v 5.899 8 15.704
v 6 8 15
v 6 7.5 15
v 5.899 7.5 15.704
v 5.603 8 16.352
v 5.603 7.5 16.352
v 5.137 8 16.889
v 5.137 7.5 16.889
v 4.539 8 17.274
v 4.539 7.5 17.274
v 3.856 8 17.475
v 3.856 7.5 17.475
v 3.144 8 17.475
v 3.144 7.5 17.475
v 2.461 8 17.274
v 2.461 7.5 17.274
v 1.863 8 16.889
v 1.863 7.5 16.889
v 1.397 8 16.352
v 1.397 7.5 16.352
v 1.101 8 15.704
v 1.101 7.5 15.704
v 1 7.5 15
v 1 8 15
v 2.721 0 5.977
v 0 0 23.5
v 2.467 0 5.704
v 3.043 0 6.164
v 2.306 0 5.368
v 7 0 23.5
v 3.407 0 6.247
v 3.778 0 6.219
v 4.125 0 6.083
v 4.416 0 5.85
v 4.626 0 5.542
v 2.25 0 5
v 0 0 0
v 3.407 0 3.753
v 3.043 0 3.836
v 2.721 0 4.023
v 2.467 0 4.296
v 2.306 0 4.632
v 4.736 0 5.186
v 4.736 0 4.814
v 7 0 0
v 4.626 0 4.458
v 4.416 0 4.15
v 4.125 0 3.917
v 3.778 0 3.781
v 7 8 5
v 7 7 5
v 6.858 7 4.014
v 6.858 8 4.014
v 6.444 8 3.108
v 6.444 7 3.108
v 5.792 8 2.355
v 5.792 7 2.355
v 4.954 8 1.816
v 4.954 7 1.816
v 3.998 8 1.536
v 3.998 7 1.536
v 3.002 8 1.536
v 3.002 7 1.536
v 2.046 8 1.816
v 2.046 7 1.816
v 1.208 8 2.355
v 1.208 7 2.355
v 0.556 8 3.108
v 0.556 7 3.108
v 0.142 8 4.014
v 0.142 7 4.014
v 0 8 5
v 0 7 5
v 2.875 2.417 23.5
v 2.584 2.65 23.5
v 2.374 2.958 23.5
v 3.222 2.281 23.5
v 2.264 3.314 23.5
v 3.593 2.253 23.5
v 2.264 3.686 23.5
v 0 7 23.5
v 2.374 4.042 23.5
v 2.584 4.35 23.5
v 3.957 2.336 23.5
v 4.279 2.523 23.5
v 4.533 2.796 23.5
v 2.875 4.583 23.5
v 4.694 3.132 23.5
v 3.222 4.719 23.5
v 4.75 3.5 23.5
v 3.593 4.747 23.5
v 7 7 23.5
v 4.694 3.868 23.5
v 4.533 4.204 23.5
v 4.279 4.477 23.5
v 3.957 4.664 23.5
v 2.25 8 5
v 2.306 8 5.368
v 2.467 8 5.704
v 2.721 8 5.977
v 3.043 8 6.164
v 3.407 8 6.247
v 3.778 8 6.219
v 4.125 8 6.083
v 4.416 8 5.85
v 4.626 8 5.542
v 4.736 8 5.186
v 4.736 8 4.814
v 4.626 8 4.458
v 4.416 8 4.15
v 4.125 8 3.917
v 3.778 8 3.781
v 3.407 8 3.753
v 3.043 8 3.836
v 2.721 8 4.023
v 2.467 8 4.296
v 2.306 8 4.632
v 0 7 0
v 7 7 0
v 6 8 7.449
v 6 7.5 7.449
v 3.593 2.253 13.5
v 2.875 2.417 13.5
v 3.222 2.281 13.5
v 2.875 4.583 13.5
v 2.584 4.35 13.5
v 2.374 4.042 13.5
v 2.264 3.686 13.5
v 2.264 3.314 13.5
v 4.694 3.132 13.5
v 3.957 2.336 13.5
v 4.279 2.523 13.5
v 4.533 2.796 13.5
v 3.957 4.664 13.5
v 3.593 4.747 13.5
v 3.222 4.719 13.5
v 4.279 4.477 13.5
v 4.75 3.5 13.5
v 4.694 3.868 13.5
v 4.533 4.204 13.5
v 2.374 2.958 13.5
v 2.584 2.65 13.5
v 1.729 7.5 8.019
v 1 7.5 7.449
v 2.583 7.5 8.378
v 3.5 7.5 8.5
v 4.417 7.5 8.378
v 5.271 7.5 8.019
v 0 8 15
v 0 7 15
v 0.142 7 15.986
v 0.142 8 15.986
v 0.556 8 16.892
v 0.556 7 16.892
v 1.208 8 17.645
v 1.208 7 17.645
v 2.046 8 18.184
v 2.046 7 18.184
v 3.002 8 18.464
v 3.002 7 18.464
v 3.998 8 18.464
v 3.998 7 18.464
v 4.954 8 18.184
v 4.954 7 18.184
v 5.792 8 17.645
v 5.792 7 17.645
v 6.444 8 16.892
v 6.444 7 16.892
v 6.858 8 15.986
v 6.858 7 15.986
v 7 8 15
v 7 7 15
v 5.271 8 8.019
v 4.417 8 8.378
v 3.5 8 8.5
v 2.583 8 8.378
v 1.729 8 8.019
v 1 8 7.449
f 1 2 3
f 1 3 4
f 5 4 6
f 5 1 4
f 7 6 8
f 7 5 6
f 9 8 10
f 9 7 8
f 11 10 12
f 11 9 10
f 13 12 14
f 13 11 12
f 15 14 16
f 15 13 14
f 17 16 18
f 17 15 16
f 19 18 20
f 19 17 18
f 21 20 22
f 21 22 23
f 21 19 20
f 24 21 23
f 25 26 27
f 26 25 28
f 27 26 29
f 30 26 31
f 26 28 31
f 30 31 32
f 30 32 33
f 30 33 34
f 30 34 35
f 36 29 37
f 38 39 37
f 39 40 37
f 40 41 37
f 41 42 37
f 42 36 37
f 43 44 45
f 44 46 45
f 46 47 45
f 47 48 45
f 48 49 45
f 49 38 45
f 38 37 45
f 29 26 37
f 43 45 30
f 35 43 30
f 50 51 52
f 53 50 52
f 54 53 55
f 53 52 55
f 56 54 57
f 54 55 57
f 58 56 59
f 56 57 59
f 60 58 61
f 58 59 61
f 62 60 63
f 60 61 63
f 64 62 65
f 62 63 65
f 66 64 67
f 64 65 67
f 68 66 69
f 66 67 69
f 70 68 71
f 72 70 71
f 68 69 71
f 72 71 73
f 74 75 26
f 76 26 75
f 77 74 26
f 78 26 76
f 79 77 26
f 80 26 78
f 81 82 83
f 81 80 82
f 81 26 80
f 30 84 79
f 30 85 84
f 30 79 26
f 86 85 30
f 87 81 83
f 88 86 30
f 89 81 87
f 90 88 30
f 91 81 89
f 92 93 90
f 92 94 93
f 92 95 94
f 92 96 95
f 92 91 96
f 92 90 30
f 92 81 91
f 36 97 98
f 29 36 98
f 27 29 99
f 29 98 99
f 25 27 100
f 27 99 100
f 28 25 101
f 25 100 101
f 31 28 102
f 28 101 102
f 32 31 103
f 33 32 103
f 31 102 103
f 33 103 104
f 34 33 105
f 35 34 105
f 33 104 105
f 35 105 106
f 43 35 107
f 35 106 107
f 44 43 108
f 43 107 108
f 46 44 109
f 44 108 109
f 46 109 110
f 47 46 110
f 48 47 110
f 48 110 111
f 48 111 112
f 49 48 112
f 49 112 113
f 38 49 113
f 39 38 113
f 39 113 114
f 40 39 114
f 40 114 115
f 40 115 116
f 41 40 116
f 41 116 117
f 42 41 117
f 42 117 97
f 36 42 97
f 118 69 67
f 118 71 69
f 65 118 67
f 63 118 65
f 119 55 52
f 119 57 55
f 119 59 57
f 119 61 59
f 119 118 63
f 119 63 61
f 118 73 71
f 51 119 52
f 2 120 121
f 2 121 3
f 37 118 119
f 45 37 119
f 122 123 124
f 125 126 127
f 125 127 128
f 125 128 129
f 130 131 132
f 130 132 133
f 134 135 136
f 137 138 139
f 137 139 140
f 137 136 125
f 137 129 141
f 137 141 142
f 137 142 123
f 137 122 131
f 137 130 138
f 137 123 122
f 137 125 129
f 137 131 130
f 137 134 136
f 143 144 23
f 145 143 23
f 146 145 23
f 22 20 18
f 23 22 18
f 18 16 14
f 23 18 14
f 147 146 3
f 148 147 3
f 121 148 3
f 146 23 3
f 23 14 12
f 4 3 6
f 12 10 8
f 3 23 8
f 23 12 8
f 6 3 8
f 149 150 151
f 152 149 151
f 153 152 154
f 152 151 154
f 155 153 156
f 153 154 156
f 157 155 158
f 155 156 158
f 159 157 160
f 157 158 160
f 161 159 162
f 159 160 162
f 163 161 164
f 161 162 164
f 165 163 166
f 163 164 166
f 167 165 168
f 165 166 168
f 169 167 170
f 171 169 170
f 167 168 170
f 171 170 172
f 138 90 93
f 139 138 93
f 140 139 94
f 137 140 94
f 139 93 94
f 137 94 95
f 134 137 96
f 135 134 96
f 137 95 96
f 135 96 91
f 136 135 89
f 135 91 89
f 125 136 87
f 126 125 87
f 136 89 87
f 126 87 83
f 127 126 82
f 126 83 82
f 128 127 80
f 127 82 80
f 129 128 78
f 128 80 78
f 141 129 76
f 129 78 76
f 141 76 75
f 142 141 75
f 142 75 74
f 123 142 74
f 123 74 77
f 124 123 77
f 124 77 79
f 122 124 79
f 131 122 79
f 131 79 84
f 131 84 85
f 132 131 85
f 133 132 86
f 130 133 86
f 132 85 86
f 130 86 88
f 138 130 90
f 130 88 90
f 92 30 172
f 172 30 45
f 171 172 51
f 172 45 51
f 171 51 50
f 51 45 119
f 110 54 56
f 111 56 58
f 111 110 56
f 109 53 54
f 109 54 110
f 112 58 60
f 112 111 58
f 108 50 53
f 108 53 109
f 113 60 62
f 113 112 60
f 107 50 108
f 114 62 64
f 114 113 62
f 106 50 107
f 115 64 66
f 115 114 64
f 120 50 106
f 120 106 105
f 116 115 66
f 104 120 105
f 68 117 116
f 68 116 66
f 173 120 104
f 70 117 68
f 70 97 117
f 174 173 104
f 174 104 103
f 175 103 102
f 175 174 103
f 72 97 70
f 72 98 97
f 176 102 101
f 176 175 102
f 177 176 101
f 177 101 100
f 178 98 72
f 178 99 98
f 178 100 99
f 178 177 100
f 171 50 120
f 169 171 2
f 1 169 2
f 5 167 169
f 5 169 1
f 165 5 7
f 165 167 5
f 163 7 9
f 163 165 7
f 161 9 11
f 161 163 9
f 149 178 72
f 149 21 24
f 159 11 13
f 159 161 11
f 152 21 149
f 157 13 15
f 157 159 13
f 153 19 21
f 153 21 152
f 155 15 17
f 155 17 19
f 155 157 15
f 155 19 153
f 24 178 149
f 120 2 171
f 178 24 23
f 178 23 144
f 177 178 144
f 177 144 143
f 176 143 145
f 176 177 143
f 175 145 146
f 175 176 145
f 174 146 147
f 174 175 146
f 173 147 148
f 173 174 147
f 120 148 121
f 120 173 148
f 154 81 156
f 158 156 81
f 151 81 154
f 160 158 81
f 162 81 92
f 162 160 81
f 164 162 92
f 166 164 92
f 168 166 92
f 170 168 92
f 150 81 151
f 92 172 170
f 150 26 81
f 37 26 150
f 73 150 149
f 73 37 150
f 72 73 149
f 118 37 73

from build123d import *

# Parameters (mm, degrees)
ESQUISSE1_W             = 7
ESQUISSE1_H             = 7
BASE_EXTRUSION_DEPTH    = 23.5
BOSS_EXTRU_1_DEPTH      = 1
ESQUISSE3_R             = 1.25
ENL_V_MAT_EXTRU_1_DEPTH = 9
ENL_V_MAT_EXTRU_2_DEPTH = 0.5
ESQUISSE5_R             = 1.25
ENL_V_MAT_EXTRU_3_DEPTH = 10


with BuildPart() as part:
    # Esquisse1 → Base-Extrusion (new body)
    with BuildSketch(Plane.XY):
        with Locations((3.5, 3.5)):
            Rectangle(ESQUISSE1_W, ESQUISSE1_H)
    extrude(amount=BASE_EXTRUSION_DEPTH)

    # Esquisse2 → Boss.-Extru.1 (add)
    with BuildSketch(Plane(origin=(0, 7, 0), x_dir=(-1, 0, 0), z_dir=(0, 1, 0))):
        with BuildLine():
            Line((0, 5), (0, 15))
            ThreePointArc((0, 15), (-3.5, 18.5), (-7, 15))
            Line((-7, 15), (-7, 5))
            ThreePointArc((-7, 5), (-3.5, 1.5), (0, 5))
        make_face()
    extrude(amount=BOSS_EXTRU_1_DEPTH)

    # Esquisse3 → Enlèv. mat.-Extru.1 (cut, through all)
    with BuildSketch(Plane(origin=(0, 8, 0), x_dir=(-1, 0, 0), z_dir=(0, 1, 0))):
        with Locations((-3.5, 5)):
            Circle(ESQUISSE3_R)
    extrude(amount=-ENL_V_MAT_EXTRU_1_DEPTH, mode=Mode.SUBTRACT)

    # Esquisse4 → Enlèv. mat.-Extru.2 (cut)
    with BuildSketch(Plane(origin=(0, 8, 0), x_dir=(-1, 0, 0), z_dir=(0, 1, 0))):
        with BuildLine():
            Line((-1, 15), (-1, 7.449489743))
            ThreePointArc((-1, 7.449489743), (-3.5, 8.5), (-6, 7.449489743))
            Line((-6, 7.449489743), (-6, 15))
            ThreePointArc((-6, 15), (-3.5, 17.5), (-1, 15))
        make_face()
    extrude(amount=-ENL_V_MAT_EXTRU_2_DEPTH, mode=Mode.SUBTRACT)

    # Esquisse5 → Enlèv. mat.-Extru.3 (cut)
    with BuildSketch(Plane.XY.offset(23.5)):
        with Locations((3.5, 3.5)):
            Circle(ESQUISSE5_R)
    extrude(amount=-ENL_V_MAT_EXTRU_3_DEPTH, mode=Mode.SUBTRACT)


solid = part.part
